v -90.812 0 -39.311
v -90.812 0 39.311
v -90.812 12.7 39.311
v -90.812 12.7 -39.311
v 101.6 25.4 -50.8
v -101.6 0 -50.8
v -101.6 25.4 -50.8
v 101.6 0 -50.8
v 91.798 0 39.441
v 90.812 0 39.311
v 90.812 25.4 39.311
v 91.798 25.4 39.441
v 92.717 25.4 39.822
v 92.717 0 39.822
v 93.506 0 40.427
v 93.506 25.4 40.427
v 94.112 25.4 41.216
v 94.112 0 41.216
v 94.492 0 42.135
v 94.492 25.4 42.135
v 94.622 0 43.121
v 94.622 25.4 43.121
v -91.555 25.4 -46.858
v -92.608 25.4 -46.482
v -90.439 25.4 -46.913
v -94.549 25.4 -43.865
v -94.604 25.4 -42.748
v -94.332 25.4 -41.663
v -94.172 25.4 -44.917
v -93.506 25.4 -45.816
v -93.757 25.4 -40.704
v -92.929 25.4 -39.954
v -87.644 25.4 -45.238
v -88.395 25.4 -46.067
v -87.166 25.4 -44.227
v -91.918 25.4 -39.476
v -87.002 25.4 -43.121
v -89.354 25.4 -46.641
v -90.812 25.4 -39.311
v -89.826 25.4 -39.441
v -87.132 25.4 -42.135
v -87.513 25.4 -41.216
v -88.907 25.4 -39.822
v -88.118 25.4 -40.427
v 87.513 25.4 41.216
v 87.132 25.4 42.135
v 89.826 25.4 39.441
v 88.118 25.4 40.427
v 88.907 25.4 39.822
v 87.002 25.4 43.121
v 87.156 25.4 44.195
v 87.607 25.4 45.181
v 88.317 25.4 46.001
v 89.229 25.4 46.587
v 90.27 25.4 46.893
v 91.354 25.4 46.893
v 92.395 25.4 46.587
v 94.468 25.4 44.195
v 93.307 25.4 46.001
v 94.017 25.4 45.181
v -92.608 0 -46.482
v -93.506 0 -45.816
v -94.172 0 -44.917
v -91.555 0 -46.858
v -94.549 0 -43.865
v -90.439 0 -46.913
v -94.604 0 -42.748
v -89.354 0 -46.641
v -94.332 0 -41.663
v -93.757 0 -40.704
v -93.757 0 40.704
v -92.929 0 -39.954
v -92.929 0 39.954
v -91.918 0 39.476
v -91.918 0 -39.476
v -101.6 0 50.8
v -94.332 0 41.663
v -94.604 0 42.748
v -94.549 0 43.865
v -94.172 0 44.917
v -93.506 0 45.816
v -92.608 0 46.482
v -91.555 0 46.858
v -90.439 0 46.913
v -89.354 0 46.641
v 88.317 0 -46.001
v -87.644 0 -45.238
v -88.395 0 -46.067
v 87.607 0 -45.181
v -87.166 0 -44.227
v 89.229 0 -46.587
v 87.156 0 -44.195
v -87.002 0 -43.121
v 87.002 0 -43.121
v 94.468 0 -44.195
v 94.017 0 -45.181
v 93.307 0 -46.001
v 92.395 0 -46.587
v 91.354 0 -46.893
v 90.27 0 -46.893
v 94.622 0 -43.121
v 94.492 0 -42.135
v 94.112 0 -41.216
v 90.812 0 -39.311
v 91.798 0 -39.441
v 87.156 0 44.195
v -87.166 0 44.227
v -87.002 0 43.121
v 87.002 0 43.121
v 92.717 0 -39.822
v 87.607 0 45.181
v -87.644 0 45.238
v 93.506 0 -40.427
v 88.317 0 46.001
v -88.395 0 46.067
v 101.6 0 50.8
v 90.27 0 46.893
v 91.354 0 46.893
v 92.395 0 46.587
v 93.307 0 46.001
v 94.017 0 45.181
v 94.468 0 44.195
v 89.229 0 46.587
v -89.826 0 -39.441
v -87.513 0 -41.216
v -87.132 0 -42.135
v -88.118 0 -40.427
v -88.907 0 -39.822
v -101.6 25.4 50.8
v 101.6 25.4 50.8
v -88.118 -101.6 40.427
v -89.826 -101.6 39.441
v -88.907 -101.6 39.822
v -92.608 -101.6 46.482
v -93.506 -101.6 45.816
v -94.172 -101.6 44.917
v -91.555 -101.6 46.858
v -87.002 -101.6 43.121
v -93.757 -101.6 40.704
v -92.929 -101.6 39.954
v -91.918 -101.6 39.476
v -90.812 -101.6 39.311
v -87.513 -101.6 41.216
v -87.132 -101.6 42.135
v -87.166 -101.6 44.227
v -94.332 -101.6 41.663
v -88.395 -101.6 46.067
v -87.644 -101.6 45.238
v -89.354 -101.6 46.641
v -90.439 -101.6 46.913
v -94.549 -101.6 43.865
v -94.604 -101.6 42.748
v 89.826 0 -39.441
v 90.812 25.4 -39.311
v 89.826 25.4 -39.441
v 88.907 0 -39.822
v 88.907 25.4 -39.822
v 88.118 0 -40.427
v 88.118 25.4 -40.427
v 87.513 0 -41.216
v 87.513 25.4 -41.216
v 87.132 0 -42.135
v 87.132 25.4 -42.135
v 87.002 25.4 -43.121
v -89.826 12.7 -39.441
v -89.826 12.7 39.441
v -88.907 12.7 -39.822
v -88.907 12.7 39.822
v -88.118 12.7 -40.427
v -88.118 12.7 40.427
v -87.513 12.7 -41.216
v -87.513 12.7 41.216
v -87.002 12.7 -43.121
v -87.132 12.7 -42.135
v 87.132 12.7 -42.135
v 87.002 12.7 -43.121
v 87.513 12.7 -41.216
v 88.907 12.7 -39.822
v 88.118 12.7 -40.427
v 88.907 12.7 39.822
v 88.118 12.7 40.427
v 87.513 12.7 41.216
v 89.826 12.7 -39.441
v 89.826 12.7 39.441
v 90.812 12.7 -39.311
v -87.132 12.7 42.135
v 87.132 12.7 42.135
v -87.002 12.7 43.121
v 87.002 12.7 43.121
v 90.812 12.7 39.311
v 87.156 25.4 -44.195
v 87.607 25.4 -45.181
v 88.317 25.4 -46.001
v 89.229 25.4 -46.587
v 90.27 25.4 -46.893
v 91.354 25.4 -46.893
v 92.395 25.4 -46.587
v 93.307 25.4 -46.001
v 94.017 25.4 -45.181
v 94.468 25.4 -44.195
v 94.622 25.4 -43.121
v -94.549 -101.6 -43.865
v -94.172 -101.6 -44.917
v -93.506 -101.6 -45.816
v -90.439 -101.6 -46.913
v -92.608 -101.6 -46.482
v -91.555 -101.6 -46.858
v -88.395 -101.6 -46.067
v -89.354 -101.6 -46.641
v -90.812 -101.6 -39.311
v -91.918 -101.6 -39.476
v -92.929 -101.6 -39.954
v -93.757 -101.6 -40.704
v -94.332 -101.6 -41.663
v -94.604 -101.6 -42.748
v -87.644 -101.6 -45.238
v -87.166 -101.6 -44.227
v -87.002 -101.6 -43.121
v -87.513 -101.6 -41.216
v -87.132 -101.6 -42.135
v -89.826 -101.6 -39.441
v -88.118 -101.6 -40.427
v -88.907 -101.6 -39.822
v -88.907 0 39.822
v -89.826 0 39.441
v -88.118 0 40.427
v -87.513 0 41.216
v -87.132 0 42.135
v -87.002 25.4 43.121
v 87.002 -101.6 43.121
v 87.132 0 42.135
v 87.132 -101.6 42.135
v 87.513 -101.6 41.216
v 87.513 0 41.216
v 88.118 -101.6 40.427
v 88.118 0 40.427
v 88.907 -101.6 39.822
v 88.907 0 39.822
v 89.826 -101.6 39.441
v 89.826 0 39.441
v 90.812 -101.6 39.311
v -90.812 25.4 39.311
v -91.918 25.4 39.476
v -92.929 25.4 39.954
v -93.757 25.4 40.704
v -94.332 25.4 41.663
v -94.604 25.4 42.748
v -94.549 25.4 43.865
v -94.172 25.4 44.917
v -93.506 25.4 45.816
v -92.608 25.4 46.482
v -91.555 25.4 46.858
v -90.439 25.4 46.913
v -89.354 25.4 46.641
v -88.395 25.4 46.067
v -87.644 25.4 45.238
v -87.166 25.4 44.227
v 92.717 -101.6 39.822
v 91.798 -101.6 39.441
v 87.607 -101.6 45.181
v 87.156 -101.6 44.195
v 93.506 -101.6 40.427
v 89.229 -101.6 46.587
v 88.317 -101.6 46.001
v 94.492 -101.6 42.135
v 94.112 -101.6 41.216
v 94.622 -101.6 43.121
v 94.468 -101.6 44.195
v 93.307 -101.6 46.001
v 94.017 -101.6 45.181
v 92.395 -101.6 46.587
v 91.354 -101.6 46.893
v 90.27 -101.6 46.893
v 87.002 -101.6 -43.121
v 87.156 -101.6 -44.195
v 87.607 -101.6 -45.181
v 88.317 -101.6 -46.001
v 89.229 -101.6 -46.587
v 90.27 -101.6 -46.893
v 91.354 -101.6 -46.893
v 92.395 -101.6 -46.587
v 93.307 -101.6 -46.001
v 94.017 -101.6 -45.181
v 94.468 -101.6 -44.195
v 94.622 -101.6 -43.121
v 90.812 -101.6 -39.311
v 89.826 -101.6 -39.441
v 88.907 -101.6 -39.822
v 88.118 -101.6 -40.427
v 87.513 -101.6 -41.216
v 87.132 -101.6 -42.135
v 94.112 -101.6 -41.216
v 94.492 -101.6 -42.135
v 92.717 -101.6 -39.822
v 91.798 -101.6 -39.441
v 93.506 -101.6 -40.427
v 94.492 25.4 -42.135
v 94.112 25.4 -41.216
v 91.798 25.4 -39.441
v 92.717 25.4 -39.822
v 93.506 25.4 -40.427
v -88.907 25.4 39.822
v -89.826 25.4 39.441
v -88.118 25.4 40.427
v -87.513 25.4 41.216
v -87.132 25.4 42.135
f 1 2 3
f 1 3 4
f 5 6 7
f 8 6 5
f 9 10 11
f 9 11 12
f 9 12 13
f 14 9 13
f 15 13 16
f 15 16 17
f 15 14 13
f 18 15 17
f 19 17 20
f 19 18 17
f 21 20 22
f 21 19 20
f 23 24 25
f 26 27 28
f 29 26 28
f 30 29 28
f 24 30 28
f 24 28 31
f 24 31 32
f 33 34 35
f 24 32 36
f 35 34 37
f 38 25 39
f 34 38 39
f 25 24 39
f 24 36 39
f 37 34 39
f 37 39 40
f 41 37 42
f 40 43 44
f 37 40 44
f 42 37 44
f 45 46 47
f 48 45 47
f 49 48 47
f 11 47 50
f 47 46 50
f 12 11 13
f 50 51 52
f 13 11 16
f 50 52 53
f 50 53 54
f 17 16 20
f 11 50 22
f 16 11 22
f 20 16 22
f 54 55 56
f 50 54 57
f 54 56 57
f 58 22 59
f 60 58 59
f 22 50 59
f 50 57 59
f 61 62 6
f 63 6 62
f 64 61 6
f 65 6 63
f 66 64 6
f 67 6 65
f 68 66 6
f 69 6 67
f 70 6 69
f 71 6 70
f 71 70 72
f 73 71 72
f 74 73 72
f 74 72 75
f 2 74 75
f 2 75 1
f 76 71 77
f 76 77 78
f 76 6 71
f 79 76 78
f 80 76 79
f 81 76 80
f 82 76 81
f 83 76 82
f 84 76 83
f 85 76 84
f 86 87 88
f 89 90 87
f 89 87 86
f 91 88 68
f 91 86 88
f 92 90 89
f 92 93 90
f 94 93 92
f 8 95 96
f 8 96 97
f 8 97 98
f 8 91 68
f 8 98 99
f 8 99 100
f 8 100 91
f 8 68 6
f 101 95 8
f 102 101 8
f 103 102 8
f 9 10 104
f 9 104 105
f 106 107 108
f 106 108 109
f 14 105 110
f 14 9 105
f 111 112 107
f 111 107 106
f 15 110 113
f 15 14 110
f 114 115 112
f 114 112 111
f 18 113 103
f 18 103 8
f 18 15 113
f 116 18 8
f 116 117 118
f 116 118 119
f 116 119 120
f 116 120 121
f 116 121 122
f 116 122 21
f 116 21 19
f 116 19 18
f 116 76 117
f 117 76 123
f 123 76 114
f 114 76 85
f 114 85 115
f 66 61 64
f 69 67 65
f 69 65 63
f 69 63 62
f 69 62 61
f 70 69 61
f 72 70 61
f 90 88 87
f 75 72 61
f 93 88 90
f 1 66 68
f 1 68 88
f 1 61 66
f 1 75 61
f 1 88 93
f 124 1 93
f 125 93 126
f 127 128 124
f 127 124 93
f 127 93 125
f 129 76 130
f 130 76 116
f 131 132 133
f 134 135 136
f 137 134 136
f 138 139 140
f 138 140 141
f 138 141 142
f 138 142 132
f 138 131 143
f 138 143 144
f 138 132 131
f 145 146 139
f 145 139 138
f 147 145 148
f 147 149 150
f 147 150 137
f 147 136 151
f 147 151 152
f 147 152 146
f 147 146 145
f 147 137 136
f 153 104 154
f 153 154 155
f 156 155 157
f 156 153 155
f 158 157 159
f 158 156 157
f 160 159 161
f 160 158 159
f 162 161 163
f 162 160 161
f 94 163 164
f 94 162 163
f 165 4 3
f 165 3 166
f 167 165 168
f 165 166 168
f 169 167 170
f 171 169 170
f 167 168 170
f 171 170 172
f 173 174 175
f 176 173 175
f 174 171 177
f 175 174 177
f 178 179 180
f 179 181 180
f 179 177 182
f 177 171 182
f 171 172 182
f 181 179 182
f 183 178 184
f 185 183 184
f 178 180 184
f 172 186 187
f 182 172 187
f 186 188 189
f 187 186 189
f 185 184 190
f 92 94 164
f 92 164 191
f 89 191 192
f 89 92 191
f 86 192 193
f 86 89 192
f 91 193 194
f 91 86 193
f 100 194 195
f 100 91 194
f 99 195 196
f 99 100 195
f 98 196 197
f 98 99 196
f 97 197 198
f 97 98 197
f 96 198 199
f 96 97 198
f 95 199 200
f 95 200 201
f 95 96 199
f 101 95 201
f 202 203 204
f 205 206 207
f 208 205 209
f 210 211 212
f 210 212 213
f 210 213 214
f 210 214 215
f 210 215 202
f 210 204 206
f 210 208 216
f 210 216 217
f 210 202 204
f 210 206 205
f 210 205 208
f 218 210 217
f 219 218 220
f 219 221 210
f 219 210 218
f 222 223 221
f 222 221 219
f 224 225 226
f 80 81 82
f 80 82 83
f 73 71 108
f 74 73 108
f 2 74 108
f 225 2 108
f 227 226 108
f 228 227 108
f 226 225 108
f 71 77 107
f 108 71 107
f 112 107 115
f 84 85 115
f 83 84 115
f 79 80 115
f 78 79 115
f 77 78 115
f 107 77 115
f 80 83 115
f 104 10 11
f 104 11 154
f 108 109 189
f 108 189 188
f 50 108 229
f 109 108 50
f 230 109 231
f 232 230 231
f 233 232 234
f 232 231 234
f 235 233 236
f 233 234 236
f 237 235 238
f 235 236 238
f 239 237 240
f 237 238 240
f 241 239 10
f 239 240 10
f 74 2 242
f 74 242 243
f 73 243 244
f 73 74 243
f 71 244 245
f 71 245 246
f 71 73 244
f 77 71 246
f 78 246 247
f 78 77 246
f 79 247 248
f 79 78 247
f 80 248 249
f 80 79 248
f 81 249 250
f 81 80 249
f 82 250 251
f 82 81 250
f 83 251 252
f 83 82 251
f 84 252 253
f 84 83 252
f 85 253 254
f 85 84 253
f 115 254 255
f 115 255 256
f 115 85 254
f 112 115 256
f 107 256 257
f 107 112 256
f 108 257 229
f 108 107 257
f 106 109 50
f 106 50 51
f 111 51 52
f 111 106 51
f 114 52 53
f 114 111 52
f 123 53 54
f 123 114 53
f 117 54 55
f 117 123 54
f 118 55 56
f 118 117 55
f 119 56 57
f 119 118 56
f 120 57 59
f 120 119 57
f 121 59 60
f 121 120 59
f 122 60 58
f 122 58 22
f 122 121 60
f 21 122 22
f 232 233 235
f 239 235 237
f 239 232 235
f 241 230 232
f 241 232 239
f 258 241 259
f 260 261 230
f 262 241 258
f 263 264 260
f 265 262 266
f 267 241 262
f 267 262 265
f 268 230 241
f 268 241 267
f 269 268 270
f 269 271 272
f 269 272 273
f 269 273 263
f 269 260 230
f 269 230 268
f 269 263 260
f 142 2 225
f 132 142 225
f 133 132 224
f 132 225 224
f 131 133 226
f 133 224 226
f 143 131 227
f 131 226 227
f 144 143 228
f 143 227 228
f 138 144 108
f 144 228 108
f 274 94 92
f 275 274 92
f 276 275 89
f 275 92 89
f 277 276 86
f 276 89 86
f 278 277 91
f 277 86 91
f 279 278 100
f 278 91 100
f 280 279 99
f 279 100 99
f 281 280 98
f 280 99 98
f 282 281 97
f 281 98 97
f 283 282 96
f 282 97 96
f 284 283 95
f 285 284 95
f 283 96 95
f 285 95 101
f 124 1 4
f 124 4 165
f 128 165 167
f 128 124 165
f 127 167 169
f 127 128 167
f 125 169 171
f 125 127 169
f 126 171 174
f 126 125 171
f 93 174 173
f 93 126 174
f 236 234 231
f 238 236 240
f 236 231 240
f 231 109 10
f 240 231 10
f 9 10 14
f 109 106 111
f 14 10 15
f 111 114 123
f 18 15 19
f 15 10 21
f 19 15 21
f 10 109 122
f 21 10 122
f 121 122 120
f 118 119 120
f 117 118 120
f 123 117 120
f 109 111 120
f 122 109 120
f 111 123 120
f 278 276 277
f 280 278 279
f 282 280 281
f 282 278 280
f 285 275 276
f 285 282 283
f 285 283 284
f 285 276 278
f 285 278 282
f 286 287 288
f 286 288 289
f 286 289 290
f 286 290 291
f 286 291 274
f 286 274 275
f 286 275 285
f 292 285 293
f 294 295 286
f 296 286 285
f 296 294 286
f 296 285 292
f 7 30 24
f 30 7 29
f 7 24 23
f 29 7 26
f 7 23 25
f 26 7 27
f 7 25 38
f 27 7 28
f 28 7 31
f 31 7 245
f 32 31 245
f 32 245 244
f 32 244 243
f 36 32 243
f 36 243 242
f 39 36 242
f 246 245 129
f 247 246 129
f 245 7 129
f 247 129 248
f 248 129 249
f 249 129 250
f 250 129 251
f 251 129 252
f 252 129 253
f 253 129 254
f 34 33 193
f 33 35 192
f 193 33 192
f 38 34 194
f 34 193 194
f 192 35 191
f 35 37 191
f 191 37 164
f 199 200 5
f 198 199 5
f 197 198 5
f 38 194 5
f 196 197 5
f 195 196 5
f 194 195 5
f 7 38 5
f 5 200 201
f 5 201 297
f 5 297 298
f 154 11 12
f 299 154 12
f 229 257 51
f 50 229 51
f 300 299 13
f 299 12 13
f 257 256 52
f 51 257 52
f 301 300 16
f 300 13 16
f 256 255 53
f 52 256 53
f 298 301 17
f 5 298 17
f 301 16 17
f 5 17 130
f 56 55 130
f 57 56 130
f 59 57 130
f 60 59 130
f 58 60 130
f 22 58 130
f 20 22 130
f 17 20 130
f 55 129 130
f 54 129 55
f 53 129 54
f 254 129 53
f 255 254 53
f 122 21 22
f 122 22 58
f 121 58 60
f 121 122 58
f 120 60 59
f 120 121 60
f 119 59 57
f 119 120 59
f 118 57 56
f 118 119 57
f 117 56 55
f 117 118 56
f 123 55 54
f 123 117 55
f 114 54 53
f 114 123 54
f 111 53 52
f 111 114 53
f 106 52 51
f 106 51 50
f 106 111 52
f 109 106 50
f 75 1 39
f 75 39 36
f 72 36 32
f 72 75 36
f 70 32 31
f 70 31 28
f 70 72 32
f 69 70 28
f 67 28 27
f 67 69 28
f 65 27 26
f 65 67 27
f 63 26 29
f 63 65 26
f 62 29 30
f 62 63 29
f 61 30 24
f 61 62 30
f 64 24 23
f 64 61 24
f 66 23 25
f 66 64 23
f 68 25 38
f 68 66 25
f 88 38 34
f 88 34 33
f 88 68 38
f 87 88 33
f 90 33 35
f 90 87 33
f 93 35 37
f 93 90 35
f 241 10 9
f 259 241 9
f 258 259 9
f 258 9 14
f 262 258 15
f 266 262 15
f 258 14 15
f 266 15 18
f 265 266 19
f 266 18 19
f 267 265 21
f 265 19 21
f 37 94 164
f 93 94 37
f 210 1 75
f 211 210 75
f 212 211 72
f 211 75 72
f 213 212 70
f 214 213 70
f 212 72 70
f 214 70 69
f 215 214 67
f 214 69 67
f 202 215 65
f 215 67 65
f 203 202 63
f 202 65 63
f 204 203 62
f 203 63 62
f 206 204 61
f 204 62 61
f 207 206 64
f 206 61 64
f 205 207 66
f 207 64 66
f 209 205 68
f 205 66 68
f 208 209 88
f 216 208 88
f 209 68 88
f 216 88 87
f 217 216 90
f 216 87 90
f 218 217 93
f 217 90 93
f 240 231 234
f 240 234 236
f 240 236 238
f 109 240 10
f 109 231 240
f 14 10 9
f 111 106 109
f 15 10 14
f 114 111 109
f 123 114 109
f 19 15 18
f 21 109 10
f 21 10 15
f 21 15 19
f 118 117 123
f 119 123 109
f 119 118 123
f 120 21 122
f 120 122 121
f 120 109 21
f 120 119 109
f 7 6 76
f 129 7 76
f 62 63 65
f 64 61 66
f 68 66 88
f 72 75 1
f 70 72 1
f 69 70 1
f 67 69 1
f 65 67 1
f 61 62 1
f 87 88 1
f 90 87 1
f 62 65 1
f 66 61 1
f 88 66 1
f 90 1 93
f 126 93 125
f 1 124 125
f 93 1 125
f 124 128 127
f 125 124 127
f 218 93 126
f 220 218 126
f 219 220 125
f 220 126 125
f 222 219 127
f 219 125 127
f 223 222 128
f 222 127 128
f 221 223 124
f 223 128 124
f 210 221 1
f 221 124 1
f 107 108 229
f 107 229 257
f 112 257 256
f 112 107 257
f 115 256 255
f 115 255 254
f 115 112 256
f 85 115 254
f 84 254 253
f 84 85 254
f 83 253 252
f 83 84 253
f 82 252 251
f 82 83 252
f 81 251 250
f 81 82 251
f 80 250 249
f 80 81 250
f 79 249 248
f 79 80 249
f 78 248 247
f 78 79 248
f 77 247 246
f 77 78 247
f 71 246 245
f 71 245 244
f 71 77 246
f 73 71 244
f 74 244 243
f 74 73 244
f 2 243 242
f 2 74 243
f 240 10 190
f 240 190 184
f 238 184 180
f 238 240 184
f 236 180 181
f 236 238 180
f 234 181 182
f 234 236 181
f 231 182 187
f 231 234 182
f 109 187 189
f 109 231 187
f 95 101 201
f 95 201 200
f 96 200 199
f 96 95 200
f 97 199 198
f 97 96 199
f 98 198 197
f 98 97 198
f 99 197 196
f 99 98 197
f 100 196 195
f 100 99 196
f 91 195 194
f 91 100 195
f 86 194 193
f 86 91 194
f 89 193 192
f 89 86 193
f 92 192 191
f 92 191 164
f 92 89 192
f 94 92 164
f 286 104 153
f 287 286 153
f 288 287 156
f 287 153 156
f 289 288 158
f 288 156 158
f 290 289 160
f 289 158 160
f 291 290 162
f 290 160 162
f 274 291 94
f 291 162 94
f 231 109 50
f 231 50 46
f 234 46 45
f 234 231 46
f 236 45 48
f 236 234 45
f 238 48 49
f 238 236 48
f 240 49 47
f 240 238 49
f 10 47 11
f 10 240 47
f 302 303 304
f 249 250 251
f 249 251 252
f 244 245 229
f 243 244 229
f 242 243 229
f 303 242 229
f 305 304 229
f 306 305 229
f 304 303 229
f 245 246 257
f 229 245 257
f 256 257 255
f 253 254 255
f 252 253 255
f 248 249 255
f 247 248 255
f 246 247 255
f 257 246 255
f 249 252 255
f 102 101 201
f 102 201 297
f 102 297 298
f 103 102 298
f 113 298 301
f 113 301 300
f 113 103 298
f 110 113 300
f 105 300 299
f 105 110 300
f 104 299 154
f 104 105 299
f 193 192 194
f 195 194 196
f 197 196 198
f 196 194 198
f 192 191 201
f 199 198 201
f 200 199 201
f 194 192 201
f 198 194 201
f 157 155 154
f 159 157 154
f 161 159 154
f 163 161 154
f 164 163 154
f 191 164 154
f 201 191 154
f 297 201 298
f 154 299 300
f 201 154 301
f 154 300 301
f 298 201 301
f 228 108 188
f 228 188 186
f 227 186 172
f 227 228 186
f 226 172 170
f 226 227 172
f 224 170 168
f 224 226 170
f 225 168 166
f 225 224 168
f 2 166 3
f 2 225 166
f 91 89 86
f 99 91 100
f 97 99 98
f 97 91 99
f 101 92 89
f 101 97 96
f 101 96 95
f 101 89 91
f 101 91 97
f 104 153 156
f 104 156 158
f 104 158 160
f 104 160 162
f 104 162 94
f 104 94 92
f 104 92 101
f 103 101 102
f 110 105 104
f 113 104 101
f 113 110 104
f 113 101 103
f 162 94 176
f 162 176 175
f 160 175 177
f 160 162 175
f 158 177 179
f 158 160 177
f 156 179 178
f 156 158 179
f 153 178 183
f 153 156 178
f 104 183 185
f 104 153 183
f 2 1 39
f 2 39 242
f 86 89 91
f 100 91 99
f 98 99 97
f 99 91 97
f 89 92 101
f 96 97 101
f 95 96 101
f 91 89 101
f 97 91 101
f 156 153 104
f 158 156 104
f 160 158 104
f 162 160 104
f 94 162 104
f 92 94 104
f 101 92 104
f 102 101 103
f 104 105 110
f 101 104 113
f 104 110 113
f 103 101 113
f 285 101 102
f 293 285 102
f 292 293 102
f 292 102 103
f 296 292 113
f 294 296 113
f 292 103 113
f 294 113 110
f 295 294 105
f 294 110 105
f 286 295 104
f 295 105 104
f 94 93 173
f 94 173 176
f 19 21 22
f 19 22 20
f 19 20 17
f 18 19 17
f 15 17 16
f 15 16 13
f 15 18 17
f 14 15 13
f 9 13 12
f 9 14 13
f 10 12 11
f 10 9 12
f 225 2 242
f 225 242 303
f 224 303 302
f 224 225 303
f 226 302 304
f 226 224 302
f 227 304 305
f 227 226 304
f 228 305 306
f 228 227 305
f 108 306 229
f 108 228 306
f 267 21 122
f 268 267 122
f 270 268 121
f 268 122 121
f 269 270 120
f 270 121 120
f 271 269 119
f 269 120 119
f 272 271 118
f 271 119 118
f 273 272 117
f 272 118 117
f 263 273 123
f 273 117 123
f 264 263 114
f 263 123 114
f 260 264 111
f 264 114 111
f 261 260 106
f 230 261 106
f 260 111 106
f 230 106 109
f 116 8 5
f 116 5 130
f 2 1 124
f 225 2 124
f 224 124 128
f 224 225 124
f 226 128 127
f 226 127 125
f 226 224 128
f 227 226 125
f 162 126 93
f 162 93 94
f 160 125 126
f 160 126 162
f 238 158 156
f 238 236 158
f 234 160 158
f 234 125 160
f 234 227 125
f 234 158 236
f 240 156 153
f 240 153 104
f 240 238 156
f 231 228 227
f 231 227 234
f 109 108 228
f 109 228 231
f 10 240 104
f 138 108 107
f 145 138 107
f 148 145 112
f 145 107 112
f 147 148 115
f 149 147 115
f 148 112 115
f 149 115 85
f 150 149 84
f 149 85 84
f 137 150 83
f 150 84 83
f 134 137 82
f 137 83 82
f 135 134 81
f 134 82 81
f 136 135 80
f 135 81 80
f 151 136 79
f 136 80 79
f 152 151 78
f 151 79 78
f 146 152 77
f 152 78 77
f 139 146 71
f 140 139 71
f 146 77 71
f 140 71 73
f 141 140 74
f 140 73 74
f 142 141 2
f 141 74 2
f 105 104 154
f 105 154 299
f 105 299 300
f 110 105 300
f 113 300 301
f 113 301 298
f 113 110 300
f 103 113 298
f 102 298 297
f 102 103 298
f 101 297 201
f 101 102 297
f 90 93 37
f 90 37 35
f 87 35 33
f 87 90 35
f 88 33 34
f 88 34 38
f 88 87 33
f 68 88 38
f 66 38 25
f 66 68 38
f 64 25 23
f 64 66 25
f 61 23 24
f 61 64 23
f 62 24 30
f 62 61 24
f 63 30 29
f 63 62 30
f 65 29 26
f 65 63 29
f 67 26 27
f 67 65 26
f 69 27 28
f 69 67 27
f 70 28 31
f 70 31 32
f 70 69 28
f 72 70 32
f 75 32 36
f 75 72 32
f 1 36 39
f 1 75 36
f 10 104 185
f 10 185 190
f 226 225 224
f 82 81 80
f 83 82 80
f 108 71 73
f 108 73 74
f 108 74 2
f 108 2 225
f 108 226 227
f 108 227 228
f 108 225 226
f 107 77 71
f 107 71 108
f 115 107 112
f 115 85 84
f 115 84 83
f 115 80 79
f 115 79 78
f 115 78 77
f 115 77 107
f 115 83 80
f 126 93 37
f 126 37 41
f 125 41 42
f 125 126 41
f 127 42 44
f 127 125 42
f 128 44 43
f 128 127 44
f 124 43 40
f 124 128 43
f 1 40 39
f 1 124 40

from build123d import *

# Parameters (mm, degrees)
F0_W     = 203.2
F0_H     = 101.6
F1_DEPTH = 25.4
F2_DEPTH = 101.6
F3_DEPTH = 12.7
F4_DEPTH = 25.4


with BuildPart() as f1:
    # F0 (on Front) → F1 (new body)
    with BuildSketch(Plane.XZ):
        Rectangle(F0_W, F0_H)
        with BuildLine():
            ThreePointArc((-90.8121094108, 39.3114757264), (-93.5061862471, 45.8155525627), (-87.0021094108, 43.1214757264))
            Line((-87.0021094108, 43.1214757264), (87.0021094108, 43.1214757264))
            ThreePointArc((87.0021094108, 43.1214757264), (90.8121094108, 46.9314757264), (94.6221094108, 43.1214757264))
            ThreePointArc((94.6221094108, 43.1214757264), (93.5061862471, 40.42739889), (90.8121094108, 39.3114757264))
            Line((90.8121094108, 39.3114757264), (90.8121094108, -39.3114757264))
            ThreePointArc((90.8121094108, -39.3114757264), (93.5061862471, -40.42739889), (94.6221094108, -43.1214757264))
            ThreePointArc((94.6221094108, -43.1214757264), (90.8121094108, -46.9314757264), (87.0021094108, -43.1214757264))
            Line((87.0021094108, -43.1214757264), (-87.0021094108, -43.1214757264))
            ThreePointArc((-87.0021094108, -43.1214757264), (-93.5061862471, -45.8155525627), (-90.8121094108, -39.3114757264))
            Line((-90.8121094108, -39.3114757264), (-90.8121094108, 39.3114757264))
        make_face(mode=Mode.SUBTRACT)
    extrude(amount=-F1_DEPTH)


with BuildPart() as f2:
    # F0 (on Front) → F2 (new body)
    with BuildSketch(Plane.XZ):
        with BuildLine():
            Line((-90.8121094108, 43.1214757264), (-87.0021094108, 43.1214757264))
            ThreePointArc((-87.0021094108, 43.1214757264), (-93.5061862471, 45.8155525627), (-90.8121094108, 39.3114757264))
            Line((-90.8121094108, 39.3114757264), (-90.8121094108, 43.1214757264))
        make_face()
        with BuildLine():
            ThreePointArc((-90.8121094108, 39.3114757264), (-88.1180325744, 40.42739889), (-87.0021094108, 43.1214757264))
            Line((-87.0021094108, 43.1214757264), (-90.8121094108, 43.1214757264))
            Line((-90.8121094108, 43.1214757264), (-90.8121094108, 39.3114757264))
        make_face()
    extrude(amount=F2_DEPTH)


with BuildPart() as f2b:
    # F0 (on Front) → F2, piece 2 (new body)
    with BuildSketch(Plane.XZ):
        with BuildLine():
            ThreePointArc((-87.0021094108, -43.1214757264), (-88.1180325744, -40.42739889), (-90.8121094108, -39.3114757264))
            Line((-90.8121094108, -39.3114757264), (-90.8121094108, -43.1214757264))
            Line((-90.8121094108, -43.1214757264), (-87.0021094108, -43.1214757264))
        make_face()
        with BuildLine():
            Line((-90.8121094108, -43.1214757264), (-90.8121094108, -39.3114757264))
            ThreePointArc((-90.8121094108, -39.3114757264), (-93.5061862471, -45.8155525627), (-87.0021094108, -43.1214757264))
            Line((-87.0021094108, -43.1214757264), (-90.8121094108, -43.1214757264))
        make_face()
    extrude(amount=F2_DEPTH)


with BuildPart() as f2c:
    # F0 (on Front) → F2, piece 3 (new body)
    with BuildSketch(Plane.XZ):
        with BuildLine():
            ThreePointArc((94.6221094108, -43.1214757264), (93.5061862471, -40.42739889), (90.8121094108, -39.3114757264))
            Line((90.8121094108, -39.3114757264), (90.8121094108, -43.1214757264))
            Line((90.8121094108, -43.1214757264), (87.0021094108, -43.1214757264))
            ThreePointArc((87.0021094108, -43.1214757264), (90.8121094108, -46.9314757264), (94.6221094108, -43.1214757264))
        make_face()
        with BuildLine():
            Line((90.8121094108, -43.1214757264), (90.8121094108, -39.3114757264))
            ThreePointArc((90.8121094108, -39.3114757264), (88.1180325744, -40.42739889), (87.0021094108, -43.1214757264))
            Line((87.0021094108, -43.1214757264), (90.8121094108, -43.1214757264))
        make_face()
    extrude(amount=F2_DEPTH)


with BuildPart() as f2d:
    # F0 (on Front) → F2, piece 4 (new body)
    with BuildSketch(Plane.XZ):
        with BuildLine():
            Line((90.8121094108, 43.1214757264), (87.0021094108, 43.1214757264))
            ThreePointArc((87.0021094108, 43.1214757264), (88.1180325744, 40.42739889), (90.8121094108, 39.3114757264))
            Line((90.8121094108, 39.3114757264), (90.8121094108, 43.1214757264))
        make_face()
        with BuildLine():
            ThreePointArc((94.6221094108, 43.1214757264), (90.8121094108, 46.9314757264), (87.0021094108, 43.1214757264))
            Line((87.0021094108, 43.1214757264), (90.8121094108, 43.1214757264))
            Line((90.8121094108, 43.1214757264), (90.8121094108, 39.3114757264))
            ThreePointArc((90.8121094108, 39.3114757264), (93.5061862471, 40.42739889), (94.6221094108, 43.1214757264))
        make_face()
    extrude(amount=F2_DEPTH)


with BuildPart() as f3:
    # F0 (on Front) → F3 (new body)
    with BuildSketch(Plane.XZ):
        with BuildLine():
            Line((87.0021094108, 43.1214757264), (-87.0021094108, 43.1214757264))
            ThreePointArc((-87.0021094108, 43.1214757264), (-88.1180325744, 40.42739889), (-90.8121094108, 39.3114757264))
            Line((-90.8121094108, 39.3114757264), (-90.8121094108, -39.3114757264))
            ThreePointArc((-90.8121094108, -39.3114757264), (-88.1180325744, -40.42739889), (-87.0021094108, -43.1214757264))
            Line((-87.0021094108, -43.1214757264), (87.0021094108, -43.1214757264))
            ThreePointArc((87.0021094108, -43.1214757264), (88.1180325744, -40.42739889), (90.8121094108, -39.3114757264))
            Line((90.8121094108, -39.3114757264), (90.8121094108, 39.3114757264))
            ThreePointArc((90.8121094108, 39.3114757264), (88.1180325744, 40.42739889), (87.0021094108, 43.1214757264))
        make_face()
    extrude(amount=-F3_DEPTH)


with BuildPart() as f4:
    # F0 (on Front) → F4 (new body)
    with BuildSketch(Plane.XZ):
        with BuildLine():
            Line((-90.8121094108, -43.1214757264), (-90.8121094108, -39.3114757264))
            ThreePointArc((-90.8121094108, -39.3114757264), (-93.5061862471, -45.8155525627), (-87.0021094108, -43.1214757264))
            Line((-87.0021094108, -43.1214757264), (-90.8121094108, -43.1214757264))
        make_face()
        with BuildLine():
            ThreePointArc((-87.0021094108, -43.1214757264), (-88.1180325744, -40.42739889), (-90.8121094108, -39.3114757264))
            Line((-90.8121094108, -39.3114757264), (-90.8121094108, -43.1214757264))
            Line((-90.8121094108, -43.1214757264), (-87.0021094108, -43.1214757264))
        make_face()
    extrude(amount=-F4_DEPTH)


with BuildPart() as f4b:
    # F0 (on Front) → F4, piece 2 (new body)
    with BuildSketch(Plane.XZ):
        with BuildLine():
            Line((-90.8121094108, 43.1214757264), (-87.0021094108, 43.1214757264))
            ThreePointArc((-87.0021094108, 43.1214757264), (-93.5061862471, 45.8155525627), (-90.8121094108, 39.3114757264))
            Line((-90.8121094108, 39.3114757264), (-90.8121094108, 43.1214757264))
        make_face()
        with BuildLine():
            ThreePointArc((-90.8121094108, 39.3114757264), (-88.1180325744, 40.42739889), (-87.0021094108, 43.1214757264))
            Line((-87.0021094108, 43.1214757264), (-90.8121094108, 43.1214757264))
            Line((-90.8121094108, 43.1214757264), (-90.8121094108, 39.3114757264))
        make_face()
    extrude(amount=-F4_DEPTH)


with BuildPart() as f4c:
    # F0 (on Front) → F4, piece 3 (new body)
    with BuildSketch(Plane.XZ):
        with BuildLine():
            ThreePointArc((94.6221094108, 43.1214757264), (90.8121094108, 46.9314757264), (87.0021094108, 43.1214757264))
            Line((87.0021094108, 43.1214757264), (90.8121094108, 43.1214757264))
            Line((90.8121094108, 43.1214757264), (90.8121094108, 39.3114757264))
            ThreePointArc((90.8121094108, 39.3114757264), (93.5061862471, 40.42739889), (94.6221094108, 43.1214757264))
        make_face()
        with BuildLine():
            Line((90.8121094108, 43.1214757264), (87.0021094108, 43.1214757264))
            ThreePointArc((87.0021094108, 43.1214757264), (88.1180325744, 40.42739889), (90.8121094108, 39.3114757264))
            Line((90.8121094108, 39.3114757264), (90.8121094108, 43.1214757264))
        make_face()
    extrude(amount=-F4_DEPTH)


with BuildPart() as f4d:
    # F0 (on Front) → F4, piece 4 (new body)
    with BuildSketch(Plane.XZ):
        with BuildLine():
            ThreePointArc((94.6221094108, -43.1214757264), (93.5061862471, -40.42739889), (90.8121094108, -39.3114757264))
            Line((90.8121094108, -39.3114757264), (90.8121094108, -43.1214757264))
            Line((90.8121094108, -43.1214757264), (87.0021094108, -43.1214757264))
            ThreePointArc((87.0021094108, -43.1214757264), (90.8121094108, -46.9314757264), (94.6221094108, -43.1214757264))
        make_face()
        with BuildLine():
            Line((90.8121094108, -43.1214757264), (90.8121094108, -39.3114757264))
            ThreePointArc((90.8121094108, -39.3114757264), (88.1180325744, -40.42739889), (87.0021094108, -43.1214757264))
            Line((87.0021094108, -43.1214757264), (90.8121094108, -43.1214757264))
        make_face()
    extrude(amount=-F4_DEPTH)


solid = Compound([f1.part, f2.part, f2b.part, f2c.part, f2d.part, f3.part, f4.part, f4b.part, f4c.part, f4d.part])
